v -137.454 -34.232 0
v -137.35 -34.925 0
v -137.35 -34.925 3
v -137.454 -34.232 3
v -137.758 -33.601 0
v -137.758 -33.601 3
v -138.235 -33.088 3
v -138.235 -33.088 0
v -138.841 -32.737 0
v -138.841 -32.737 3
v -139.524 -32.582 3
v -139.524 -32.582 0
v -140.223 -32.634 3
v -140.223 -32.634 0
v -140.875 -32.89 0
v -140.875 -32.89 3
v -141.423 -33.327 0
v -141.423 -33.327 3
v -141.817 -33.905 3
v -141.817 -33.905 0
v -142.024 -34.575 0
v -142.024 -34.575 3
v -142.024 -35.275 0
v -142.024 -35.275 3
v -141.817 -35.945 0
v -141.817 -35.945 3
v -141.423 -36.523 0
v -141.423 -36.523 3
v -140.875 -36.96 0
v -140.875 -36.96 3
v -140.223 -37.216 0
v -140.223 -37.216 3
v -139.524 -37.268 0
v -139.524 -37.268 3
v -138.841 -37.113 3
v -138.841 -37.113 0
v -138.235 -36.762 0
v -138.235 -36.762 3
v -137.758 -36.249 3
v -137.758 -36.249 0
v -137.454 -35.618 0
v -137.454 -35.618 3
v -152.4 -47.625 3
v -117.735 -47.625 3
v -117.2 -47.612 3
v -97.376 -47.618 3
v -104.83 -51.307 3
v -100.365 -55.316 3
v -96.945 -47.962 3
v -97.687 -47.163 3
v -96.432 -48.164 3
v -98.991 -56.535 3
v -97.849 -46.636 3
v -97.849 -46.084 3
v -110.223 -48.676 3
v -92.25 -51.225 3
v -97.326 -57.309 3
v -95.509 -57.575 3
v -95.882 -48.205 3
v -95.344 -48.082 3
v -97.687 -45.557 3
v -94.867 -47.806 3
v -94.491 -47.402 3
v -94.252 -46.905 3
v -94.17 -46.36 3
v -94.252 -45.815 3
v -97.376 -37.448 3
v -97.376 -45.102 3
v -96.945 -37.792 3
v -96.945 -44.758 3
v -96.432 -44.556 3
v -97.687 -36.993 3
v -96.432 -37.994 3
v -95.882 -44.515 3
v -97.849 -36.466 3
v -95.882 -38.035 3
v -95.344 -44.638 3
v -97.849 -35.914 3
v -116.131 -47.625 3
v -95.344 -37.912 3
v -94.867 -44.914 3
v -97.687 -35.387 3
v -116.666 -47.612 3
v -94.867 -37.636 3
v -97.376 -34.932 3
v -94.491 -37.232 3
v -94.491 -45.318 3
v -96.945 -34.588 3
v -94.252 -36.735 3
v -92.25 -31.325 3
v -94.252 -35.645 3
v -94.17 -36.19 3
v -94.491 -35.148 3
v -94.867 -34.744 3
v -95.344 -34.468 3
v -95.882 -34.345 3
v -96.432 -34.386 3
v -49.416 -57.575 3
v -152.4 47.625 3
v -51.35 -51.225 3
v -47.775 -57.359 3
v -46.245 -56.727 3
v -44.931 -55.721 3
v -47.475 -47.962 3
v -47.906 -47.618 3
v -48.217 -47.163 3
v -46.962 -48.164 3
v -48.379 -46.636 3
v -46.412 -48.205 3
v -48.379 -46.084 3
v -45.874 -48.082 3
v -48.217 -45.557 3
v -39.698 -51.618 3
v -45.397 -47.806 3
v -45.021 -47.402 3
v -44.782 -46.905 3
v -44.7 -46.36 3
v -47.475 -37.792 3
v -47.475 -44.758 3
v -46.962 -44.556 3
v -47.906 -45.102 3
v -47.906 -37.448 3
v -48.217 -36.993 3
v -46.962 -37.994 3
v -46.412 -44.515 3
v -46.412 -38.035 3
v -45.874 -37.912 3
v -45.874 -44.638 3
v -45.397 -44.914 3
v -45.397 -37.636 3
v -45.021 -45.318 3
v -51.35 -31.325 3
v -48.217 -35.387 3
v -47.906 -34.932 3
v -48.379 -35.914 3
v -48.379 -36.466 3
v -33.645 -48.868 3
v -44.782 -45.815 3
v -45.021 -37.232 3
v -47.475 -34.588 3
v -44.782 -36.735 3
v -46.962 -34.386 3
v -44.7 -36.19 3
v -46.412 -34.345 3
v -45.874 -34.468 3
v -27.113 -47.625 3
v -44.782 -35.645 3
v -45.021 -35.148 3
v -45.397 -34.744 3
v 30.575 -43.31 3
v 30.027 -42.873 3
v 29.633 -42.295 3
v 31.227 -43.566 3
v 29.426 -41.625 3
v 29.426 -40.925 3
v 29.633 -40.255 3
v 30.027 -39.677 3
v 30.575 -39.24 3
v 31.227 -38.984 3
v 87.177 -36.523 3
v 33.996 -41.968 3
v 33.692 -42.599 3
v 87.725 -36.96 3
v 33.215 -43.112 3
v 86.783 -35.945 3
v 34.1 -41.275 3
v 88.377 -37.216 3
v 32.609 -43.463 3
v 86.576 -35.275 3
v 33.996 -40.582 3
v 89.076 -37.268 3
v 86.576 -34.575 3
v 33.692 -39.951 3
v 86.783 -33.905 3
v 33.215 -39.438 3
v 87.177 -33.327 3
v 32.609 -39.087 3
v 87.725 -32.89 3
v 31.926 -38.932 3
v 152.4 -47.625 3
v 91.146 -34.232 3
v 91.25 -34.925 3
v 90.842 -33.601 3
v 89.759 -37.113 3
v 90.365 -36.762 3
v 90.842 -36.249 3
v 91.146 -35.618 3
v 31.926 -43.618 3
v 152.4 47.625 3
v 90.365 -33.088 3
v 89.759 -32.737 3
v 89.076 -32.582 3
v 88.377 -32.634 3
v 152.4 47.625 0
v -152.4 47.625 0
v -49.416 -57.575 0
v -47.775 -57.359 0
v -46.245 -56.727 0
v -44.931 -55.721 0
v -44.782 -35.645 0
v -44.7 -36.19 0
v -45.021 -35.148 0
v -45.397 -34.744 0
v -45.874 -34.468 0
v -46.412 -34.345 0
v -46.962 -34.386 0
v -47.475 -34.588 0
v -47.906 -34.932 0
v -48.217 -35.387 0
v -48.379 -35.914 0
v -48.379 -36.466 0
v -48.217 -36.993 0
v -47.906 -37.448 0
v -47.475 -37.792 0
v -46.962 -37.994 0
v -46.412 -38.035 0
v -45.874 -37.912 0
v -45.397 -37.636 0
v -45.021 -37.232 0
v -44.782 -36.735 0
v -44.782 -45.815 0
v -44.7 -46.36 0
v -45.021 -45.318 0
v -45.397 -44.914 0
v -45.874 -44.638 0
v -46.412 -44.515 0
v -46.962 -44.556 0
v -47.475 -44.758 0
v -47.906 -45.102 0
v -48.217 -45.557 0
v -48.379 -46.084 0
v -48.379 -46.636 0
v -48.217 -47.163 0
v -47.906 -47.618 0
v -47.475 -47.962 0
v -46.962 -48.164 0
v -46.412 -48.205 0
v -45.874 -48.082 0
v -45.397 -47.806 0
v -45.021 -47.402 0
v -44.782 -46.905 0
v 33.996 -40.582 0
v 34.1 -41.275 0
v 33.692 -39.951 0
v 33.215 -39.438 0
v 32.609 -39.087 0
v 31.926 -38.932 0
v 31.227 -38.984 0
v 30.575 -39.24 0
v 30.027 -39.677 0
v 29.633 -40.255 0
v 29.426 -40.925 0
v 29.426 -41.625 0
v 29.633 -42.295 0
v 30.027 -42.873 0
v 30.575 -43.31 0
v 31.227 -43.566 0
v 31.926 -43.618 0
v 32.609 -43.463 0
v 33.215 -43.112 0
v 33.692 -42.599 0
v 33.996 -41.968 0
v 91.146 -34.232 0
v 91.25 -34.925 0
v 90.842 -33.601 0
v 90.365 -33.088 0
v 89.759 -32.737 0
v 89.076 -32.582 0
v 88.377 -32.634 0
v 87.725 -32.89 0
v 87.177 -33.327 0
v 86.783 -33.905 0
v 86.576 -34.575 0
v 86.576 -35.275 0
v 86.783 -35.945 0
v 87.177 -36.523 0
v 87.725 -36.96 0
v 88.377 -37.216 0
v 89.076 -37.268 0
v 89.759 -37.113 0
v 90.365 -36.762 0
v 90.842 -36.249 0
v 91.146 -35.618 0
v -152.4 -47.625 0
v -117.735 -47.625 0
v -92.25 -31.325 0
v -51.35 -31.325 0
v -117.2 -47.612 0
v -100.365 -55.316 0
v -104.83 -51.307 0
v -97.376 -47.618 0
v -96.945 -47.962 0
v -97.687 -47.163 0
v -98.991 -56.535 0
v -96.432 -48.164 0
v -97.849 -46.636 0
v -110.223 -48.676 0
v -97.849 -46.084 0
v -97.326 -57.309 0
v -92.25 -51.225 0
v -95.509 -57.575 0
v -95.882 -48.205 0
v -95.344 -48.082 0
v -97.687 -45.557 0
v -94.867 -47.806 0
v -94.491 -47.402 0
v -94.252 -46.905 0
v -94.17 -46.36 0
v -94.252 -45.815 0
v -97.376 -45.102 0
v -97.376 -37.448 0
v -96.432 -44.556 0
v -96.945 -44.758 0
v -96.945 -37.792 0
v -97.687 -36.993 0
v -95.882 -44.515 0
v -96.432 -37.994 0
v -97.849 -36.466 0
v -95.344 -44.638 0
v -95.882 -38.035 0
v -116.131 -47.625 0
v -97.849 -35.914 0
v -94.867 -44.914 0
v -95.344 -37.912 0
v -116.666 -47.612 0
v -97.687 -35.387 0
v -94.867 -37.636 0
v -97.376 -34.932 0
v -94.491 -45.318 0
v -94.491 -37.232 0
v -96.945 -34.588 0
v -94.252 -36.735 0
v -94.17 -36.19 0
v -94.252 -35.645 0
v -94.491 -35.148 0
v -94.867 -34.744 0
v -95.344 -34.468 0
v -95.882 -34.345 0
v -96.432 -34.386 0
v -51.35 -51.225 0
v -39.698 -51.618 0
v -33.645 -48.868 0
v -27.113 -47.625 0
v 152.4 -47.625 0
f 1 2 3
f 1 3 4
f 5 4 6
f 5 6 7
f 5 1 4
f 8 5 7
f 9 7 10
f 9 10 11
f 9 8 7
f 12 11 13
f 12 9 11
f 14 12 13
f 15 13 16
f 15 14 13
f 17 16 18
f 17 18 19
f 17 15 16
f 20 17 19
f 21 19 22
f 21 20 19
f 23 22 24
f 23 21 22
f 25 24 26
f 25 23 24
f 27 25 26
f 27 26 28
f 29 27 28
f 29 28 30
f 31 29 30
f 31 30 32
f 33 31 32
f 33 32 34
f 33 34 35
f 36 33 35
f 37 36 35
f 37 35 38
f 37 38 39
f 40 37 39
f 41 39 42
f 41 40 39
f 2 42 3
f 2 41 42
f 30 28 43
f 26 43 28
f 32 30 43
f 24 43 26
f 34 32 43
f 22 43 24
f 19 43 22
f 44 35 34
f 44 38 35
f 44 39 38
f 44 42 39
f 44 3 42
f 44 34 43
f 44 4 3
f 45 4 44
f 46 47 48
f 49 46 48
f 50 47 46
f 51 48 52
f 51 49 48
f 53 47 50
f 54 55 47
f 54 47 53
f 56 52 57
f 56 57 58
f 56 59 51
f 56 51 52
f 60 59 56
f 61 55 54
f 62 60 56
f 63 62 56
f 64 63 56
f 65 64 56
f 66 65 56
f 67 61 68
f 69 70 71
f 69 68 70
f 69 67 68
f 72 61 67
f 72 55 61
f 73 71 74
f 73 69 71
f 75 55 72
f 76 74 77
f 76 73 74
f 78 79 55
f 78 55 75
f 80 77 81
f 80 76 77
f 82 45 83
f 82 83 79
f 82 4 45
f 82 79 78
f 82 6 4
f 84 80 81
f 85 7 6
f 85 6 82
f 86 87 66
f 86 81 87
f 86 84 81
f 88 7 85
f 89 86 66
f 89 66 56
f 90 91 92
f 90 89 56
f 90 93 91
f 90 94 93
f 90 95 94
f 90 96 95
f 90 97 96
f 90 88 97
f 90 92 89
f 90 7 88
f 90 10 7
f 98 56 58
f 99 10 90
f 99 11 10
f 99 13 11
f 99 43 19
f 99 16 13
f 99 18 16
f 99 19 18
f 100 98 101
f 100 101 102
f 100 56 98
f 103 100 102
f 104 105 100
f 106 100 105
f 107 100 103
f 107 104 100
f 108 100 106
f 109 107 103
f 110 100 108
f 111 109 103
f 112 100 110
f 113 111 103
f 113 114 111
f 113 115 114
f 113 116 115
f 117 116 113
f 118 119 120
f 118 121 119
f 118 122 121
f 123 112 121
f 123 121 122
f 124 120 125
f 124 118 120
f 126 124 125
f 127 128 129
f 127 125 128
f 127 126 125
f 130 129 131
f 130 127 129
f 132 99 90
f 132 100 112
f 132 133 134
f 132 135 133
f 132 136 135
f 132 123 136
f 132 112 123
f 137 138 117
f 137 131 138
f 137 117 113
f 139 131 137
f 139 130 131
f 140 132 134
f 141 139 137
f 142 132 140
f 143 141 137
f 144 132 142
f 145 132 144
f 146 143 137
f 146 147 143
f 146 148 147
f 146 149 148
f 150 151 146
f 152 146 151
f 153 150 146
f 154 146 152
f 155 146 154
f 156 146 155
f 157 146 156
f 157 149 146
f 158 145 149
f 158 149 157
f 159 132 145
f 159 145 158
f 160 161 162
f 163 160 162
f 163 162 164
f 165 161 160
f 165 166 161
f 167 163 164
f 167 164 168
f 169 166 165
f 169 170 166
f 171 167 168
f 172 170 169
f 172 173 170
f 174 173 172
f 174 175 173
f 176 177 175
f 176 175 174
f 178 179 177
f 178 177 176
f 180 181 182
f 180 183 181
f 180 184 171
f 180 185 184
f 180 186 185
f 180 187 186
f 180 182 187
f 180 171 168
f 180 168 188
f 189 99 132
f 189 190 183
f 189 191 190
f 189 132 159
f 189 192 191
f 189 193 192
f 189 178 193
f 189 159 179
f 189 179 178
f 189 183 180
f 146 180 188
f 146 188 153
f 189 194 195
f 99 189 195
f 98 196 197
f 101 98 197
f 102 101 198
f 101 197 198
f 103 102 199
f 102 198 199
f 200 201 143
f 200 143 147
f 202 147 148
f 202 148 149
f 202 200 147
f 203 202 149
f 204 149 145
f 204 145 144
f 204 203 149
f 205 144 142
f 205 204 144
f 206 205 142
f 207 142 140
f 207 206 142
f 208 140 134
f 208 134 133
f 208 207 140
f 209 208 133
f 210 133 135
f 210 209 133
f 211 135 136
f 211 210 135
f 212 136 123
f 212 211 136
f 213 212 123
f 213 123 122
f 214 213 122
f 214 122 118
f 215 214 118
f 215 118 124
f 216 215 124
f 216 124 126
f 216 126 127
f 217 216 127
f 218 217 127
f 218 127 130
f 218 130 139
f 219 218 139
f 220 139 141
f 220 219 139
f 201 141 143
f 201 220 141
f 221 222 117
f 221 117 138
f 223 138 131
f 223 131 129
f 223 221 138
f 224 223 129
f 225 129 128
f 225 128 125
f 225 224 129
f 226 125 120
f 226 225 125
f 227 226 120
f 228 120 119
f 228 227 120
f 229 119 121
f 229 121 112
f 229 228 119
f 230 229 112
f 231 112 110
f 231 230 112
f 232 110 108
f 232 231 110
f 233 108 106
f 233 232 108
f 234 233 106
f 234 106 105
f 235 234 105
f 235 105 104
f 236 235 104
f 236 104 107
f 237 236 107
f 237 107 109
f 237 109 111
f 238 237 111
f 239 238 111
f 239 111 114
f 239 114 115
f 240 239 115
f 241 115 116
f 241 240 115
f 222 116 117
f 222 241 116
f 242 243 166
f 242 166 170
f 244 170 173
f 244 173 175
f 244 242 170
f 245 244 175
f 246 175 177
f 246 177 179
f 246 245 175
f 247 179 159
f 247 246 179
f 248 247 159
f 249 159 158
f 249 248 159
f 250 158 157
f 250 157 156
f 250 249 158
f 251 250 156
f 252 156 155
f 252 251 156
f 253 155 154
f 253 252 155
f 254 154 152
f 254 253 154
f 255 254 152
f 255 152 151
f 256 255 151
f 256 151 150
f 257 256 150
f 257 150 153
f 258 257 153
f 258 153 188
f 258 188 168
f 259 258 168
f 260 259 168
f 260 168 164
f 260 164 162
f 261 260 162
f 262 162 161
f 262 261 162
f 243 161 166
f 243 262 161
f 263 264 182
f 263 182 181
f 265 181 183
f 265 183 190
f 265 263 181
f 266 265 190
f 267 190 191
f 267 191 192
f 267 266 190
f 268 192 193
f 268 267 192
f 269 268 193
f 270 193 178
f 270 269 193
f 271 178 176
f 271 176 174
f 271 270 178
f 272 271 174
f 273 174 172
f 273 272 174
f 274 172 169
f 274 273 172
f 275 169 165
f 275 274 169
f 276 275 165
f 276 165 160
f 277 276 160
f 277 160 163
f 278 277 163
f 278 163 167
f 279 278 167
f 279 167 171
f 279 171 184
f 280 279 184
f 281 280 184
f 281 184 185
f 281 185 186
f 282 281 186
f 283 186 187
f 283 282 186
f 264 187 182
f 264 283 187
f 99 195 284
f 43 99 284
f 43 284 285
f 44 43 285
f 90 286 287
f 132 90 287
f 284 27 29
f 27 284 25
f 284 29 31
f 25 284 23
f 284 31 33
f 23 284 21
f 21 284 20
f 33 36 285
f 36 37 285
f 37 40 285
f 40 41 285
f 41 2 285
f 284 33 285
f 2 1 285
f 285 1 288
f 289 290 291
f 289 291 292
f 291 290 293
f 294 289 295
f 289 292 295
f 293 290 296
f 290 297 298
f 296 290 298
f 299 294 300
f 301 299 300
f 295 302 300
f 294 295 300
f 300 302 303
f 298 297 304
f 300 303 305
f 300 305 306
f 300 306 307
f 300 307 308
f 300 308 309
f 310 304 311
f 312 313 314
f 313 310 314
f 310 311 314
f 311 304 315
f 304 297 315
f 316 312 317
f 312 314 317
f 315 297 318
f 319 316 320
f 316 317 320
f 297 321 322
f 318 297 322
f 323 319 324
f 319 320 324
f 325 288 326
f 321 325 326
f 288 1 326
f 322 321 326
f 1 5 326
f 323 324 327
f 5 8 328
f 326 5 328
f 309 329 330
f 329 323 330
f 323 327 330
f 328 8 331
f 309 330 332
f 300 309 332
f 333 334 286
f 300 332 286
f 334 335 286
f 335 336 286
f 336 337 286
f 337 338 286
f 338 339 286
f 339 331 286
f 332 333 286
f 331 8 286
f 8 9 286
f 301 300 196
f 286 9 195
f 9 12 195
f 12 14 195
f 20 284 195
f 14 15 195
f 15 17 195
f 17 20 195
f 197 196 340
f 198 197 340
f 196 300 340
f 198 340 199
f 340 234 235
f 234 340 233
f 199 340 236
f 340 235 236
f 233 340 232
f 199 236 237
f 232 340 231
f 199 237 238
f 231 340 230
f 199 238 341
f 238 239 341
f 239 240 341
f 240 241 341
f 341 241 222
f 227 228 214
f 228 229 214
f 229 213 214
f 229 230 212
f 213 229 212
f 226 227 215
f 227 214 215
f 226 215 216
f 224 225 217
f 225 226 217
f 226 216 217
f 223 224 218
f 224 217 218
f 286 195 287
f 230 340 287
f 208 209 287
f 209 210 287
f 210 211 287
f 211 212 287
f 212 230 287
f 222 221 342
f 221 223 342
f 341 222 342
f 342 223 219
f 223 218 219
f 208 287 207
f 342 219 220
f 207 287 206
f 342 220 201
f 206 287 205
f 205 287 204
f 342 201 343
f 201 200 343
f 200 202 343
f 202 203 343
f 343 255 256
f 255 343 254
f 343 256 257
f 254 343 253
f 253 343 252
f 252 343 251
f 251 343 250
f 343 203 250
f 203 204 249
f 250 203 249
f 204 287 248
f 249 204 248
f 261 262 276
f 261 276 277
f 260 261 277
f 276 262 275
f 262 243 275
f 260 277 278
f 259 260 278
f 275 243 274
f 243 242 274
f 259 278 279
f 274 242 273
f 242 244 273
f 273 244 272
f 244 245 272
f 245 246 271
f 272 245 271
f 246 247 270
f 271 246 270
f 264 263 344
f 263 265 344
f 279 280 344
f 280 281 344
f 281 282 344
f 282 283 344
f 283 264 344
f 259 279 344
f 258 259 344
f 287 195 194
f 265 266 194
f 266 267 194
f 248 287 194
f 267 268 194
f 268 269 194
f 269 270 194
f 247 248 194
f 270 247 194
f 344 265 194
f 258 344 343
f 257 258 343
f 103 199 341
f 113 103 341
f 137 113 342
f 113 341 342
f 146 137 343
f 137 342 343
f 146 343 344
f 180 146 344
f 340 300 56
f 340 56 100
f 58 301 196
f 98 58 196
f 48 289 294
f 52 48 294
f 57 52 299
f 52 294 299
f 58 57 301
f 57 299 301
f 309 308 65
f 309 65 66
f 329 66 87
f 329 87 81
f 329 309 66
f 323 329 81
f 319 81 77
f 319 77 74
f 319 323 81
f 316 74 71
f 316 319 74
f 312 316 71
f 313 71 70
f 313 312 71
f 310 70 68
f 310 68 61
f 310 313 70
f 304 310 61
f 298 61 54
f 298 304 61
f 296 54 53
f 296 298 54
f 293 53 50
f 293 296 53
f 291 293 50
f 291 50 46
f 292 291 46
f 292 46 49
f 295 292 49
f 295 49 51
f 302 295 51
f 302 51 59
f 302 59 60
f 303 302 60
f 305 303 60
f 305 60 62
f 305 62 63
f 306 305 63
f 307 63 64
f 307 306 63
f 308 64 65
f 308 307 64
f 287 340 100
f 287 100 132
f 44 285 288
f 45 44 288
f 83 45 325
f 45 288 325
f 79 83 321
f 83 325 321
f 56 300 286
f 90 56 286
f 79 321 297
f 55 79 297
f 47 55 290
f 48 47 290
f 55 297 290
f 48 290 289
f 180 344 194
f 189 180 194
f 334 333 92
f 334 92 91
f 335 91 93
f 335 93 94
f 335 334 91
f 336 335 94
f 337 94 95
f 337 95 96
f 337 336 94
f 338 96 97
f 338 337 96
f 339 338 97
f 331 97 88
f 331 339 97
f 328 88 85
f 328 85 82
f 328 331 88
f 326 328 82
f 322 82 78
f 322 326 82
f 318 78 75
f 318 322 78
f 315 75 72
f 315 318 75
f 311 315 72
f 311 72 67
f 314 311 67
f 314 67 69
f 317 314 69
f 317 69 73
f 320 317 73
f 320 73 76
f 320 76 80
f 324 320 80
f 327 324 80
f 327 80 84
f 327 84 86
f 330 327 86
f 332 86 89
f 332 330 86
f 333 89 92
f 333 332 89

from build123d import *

# Parameters (mm, degrees)
F0_R     = 1.85
F0_R_2   = 2.35
F0_W     = 40.9
F0_H     = 19.9
F1_DEPTH = 3


with BuildPart() as f1:
    # F0 (on Top) → F1 (new body)
    with BuildSketch(Plane.XY):
        with BuildLine():
            Line((-152.4, 47.625), (-152.4, -47.625))
            Line((-152.4, -47.625), (-117.734805, -47.625))
            ThreePointArc((-117.734805, -47.625), (-116.932919, -47.610153), (-116.131032, -47.625))
            ThreePointArc((-116.131032, -47.625), (-107.434809, -49.803392), (-100.365224, -55.316166))
            ThreePointArc((-100.365224, -55.316166), (-98.186821, -56.982665), (-95.5088, -57.575))
            Line((-95.5088, -57.575), (-77.11, -57.575))
            Line((-77.11, -57.575), (-49.415637, -57.575))
            ThreePointArc((-49.415637, -57.575), (-46.989367, -57.093195), (-44.931282, -55.720894))
            ThreePointArc((-44.931282, -55.720894), (-36.753686, -50.062559), (-27.112724, -47.625))
            Line((-27.112724, -47.625), (152.4, -47.625))
            Line((152.4, -47.625), (152.4, 47.625))
            Line((152.4, 47.625), (-152.4, 47.625))
        make_face()
        with Locations((-96.02, -46.36)):
            Circle(F0_R, mode=Mode.SUBTRACT)
        with Locations((-139.7, -34.925)):
            Circle(F0_R_2, mode=Mode.SUBTRACT)
        with Locations((-96.02, -36.19)):
            Circle(F0_R, mode=Mode.SUBTRACT)
        with Locations((-46.55, -46.36)):
            Circle(F0_R, mode=Mode.SUBTRACT)
        with Locations((-71.8, -41.275)):
            Rectangle(F0_W, F0_H, mode=Mode.SUBTRACT)
        with Locations((-46.55, -36.19)):
            Circle(F0_R, mode=Mode.SUBTRACT)
        with Locations((31.75, -41.275)):
            Circle(F0_R_2, mode=Mode.SUBTRACT)
        with Locations((88.9, -34.925)):
            Circle(F0_R_2, mode=Mode.SUBTRACT)
    extrude(amount=F1_DEPTH)


solid = f1.part
